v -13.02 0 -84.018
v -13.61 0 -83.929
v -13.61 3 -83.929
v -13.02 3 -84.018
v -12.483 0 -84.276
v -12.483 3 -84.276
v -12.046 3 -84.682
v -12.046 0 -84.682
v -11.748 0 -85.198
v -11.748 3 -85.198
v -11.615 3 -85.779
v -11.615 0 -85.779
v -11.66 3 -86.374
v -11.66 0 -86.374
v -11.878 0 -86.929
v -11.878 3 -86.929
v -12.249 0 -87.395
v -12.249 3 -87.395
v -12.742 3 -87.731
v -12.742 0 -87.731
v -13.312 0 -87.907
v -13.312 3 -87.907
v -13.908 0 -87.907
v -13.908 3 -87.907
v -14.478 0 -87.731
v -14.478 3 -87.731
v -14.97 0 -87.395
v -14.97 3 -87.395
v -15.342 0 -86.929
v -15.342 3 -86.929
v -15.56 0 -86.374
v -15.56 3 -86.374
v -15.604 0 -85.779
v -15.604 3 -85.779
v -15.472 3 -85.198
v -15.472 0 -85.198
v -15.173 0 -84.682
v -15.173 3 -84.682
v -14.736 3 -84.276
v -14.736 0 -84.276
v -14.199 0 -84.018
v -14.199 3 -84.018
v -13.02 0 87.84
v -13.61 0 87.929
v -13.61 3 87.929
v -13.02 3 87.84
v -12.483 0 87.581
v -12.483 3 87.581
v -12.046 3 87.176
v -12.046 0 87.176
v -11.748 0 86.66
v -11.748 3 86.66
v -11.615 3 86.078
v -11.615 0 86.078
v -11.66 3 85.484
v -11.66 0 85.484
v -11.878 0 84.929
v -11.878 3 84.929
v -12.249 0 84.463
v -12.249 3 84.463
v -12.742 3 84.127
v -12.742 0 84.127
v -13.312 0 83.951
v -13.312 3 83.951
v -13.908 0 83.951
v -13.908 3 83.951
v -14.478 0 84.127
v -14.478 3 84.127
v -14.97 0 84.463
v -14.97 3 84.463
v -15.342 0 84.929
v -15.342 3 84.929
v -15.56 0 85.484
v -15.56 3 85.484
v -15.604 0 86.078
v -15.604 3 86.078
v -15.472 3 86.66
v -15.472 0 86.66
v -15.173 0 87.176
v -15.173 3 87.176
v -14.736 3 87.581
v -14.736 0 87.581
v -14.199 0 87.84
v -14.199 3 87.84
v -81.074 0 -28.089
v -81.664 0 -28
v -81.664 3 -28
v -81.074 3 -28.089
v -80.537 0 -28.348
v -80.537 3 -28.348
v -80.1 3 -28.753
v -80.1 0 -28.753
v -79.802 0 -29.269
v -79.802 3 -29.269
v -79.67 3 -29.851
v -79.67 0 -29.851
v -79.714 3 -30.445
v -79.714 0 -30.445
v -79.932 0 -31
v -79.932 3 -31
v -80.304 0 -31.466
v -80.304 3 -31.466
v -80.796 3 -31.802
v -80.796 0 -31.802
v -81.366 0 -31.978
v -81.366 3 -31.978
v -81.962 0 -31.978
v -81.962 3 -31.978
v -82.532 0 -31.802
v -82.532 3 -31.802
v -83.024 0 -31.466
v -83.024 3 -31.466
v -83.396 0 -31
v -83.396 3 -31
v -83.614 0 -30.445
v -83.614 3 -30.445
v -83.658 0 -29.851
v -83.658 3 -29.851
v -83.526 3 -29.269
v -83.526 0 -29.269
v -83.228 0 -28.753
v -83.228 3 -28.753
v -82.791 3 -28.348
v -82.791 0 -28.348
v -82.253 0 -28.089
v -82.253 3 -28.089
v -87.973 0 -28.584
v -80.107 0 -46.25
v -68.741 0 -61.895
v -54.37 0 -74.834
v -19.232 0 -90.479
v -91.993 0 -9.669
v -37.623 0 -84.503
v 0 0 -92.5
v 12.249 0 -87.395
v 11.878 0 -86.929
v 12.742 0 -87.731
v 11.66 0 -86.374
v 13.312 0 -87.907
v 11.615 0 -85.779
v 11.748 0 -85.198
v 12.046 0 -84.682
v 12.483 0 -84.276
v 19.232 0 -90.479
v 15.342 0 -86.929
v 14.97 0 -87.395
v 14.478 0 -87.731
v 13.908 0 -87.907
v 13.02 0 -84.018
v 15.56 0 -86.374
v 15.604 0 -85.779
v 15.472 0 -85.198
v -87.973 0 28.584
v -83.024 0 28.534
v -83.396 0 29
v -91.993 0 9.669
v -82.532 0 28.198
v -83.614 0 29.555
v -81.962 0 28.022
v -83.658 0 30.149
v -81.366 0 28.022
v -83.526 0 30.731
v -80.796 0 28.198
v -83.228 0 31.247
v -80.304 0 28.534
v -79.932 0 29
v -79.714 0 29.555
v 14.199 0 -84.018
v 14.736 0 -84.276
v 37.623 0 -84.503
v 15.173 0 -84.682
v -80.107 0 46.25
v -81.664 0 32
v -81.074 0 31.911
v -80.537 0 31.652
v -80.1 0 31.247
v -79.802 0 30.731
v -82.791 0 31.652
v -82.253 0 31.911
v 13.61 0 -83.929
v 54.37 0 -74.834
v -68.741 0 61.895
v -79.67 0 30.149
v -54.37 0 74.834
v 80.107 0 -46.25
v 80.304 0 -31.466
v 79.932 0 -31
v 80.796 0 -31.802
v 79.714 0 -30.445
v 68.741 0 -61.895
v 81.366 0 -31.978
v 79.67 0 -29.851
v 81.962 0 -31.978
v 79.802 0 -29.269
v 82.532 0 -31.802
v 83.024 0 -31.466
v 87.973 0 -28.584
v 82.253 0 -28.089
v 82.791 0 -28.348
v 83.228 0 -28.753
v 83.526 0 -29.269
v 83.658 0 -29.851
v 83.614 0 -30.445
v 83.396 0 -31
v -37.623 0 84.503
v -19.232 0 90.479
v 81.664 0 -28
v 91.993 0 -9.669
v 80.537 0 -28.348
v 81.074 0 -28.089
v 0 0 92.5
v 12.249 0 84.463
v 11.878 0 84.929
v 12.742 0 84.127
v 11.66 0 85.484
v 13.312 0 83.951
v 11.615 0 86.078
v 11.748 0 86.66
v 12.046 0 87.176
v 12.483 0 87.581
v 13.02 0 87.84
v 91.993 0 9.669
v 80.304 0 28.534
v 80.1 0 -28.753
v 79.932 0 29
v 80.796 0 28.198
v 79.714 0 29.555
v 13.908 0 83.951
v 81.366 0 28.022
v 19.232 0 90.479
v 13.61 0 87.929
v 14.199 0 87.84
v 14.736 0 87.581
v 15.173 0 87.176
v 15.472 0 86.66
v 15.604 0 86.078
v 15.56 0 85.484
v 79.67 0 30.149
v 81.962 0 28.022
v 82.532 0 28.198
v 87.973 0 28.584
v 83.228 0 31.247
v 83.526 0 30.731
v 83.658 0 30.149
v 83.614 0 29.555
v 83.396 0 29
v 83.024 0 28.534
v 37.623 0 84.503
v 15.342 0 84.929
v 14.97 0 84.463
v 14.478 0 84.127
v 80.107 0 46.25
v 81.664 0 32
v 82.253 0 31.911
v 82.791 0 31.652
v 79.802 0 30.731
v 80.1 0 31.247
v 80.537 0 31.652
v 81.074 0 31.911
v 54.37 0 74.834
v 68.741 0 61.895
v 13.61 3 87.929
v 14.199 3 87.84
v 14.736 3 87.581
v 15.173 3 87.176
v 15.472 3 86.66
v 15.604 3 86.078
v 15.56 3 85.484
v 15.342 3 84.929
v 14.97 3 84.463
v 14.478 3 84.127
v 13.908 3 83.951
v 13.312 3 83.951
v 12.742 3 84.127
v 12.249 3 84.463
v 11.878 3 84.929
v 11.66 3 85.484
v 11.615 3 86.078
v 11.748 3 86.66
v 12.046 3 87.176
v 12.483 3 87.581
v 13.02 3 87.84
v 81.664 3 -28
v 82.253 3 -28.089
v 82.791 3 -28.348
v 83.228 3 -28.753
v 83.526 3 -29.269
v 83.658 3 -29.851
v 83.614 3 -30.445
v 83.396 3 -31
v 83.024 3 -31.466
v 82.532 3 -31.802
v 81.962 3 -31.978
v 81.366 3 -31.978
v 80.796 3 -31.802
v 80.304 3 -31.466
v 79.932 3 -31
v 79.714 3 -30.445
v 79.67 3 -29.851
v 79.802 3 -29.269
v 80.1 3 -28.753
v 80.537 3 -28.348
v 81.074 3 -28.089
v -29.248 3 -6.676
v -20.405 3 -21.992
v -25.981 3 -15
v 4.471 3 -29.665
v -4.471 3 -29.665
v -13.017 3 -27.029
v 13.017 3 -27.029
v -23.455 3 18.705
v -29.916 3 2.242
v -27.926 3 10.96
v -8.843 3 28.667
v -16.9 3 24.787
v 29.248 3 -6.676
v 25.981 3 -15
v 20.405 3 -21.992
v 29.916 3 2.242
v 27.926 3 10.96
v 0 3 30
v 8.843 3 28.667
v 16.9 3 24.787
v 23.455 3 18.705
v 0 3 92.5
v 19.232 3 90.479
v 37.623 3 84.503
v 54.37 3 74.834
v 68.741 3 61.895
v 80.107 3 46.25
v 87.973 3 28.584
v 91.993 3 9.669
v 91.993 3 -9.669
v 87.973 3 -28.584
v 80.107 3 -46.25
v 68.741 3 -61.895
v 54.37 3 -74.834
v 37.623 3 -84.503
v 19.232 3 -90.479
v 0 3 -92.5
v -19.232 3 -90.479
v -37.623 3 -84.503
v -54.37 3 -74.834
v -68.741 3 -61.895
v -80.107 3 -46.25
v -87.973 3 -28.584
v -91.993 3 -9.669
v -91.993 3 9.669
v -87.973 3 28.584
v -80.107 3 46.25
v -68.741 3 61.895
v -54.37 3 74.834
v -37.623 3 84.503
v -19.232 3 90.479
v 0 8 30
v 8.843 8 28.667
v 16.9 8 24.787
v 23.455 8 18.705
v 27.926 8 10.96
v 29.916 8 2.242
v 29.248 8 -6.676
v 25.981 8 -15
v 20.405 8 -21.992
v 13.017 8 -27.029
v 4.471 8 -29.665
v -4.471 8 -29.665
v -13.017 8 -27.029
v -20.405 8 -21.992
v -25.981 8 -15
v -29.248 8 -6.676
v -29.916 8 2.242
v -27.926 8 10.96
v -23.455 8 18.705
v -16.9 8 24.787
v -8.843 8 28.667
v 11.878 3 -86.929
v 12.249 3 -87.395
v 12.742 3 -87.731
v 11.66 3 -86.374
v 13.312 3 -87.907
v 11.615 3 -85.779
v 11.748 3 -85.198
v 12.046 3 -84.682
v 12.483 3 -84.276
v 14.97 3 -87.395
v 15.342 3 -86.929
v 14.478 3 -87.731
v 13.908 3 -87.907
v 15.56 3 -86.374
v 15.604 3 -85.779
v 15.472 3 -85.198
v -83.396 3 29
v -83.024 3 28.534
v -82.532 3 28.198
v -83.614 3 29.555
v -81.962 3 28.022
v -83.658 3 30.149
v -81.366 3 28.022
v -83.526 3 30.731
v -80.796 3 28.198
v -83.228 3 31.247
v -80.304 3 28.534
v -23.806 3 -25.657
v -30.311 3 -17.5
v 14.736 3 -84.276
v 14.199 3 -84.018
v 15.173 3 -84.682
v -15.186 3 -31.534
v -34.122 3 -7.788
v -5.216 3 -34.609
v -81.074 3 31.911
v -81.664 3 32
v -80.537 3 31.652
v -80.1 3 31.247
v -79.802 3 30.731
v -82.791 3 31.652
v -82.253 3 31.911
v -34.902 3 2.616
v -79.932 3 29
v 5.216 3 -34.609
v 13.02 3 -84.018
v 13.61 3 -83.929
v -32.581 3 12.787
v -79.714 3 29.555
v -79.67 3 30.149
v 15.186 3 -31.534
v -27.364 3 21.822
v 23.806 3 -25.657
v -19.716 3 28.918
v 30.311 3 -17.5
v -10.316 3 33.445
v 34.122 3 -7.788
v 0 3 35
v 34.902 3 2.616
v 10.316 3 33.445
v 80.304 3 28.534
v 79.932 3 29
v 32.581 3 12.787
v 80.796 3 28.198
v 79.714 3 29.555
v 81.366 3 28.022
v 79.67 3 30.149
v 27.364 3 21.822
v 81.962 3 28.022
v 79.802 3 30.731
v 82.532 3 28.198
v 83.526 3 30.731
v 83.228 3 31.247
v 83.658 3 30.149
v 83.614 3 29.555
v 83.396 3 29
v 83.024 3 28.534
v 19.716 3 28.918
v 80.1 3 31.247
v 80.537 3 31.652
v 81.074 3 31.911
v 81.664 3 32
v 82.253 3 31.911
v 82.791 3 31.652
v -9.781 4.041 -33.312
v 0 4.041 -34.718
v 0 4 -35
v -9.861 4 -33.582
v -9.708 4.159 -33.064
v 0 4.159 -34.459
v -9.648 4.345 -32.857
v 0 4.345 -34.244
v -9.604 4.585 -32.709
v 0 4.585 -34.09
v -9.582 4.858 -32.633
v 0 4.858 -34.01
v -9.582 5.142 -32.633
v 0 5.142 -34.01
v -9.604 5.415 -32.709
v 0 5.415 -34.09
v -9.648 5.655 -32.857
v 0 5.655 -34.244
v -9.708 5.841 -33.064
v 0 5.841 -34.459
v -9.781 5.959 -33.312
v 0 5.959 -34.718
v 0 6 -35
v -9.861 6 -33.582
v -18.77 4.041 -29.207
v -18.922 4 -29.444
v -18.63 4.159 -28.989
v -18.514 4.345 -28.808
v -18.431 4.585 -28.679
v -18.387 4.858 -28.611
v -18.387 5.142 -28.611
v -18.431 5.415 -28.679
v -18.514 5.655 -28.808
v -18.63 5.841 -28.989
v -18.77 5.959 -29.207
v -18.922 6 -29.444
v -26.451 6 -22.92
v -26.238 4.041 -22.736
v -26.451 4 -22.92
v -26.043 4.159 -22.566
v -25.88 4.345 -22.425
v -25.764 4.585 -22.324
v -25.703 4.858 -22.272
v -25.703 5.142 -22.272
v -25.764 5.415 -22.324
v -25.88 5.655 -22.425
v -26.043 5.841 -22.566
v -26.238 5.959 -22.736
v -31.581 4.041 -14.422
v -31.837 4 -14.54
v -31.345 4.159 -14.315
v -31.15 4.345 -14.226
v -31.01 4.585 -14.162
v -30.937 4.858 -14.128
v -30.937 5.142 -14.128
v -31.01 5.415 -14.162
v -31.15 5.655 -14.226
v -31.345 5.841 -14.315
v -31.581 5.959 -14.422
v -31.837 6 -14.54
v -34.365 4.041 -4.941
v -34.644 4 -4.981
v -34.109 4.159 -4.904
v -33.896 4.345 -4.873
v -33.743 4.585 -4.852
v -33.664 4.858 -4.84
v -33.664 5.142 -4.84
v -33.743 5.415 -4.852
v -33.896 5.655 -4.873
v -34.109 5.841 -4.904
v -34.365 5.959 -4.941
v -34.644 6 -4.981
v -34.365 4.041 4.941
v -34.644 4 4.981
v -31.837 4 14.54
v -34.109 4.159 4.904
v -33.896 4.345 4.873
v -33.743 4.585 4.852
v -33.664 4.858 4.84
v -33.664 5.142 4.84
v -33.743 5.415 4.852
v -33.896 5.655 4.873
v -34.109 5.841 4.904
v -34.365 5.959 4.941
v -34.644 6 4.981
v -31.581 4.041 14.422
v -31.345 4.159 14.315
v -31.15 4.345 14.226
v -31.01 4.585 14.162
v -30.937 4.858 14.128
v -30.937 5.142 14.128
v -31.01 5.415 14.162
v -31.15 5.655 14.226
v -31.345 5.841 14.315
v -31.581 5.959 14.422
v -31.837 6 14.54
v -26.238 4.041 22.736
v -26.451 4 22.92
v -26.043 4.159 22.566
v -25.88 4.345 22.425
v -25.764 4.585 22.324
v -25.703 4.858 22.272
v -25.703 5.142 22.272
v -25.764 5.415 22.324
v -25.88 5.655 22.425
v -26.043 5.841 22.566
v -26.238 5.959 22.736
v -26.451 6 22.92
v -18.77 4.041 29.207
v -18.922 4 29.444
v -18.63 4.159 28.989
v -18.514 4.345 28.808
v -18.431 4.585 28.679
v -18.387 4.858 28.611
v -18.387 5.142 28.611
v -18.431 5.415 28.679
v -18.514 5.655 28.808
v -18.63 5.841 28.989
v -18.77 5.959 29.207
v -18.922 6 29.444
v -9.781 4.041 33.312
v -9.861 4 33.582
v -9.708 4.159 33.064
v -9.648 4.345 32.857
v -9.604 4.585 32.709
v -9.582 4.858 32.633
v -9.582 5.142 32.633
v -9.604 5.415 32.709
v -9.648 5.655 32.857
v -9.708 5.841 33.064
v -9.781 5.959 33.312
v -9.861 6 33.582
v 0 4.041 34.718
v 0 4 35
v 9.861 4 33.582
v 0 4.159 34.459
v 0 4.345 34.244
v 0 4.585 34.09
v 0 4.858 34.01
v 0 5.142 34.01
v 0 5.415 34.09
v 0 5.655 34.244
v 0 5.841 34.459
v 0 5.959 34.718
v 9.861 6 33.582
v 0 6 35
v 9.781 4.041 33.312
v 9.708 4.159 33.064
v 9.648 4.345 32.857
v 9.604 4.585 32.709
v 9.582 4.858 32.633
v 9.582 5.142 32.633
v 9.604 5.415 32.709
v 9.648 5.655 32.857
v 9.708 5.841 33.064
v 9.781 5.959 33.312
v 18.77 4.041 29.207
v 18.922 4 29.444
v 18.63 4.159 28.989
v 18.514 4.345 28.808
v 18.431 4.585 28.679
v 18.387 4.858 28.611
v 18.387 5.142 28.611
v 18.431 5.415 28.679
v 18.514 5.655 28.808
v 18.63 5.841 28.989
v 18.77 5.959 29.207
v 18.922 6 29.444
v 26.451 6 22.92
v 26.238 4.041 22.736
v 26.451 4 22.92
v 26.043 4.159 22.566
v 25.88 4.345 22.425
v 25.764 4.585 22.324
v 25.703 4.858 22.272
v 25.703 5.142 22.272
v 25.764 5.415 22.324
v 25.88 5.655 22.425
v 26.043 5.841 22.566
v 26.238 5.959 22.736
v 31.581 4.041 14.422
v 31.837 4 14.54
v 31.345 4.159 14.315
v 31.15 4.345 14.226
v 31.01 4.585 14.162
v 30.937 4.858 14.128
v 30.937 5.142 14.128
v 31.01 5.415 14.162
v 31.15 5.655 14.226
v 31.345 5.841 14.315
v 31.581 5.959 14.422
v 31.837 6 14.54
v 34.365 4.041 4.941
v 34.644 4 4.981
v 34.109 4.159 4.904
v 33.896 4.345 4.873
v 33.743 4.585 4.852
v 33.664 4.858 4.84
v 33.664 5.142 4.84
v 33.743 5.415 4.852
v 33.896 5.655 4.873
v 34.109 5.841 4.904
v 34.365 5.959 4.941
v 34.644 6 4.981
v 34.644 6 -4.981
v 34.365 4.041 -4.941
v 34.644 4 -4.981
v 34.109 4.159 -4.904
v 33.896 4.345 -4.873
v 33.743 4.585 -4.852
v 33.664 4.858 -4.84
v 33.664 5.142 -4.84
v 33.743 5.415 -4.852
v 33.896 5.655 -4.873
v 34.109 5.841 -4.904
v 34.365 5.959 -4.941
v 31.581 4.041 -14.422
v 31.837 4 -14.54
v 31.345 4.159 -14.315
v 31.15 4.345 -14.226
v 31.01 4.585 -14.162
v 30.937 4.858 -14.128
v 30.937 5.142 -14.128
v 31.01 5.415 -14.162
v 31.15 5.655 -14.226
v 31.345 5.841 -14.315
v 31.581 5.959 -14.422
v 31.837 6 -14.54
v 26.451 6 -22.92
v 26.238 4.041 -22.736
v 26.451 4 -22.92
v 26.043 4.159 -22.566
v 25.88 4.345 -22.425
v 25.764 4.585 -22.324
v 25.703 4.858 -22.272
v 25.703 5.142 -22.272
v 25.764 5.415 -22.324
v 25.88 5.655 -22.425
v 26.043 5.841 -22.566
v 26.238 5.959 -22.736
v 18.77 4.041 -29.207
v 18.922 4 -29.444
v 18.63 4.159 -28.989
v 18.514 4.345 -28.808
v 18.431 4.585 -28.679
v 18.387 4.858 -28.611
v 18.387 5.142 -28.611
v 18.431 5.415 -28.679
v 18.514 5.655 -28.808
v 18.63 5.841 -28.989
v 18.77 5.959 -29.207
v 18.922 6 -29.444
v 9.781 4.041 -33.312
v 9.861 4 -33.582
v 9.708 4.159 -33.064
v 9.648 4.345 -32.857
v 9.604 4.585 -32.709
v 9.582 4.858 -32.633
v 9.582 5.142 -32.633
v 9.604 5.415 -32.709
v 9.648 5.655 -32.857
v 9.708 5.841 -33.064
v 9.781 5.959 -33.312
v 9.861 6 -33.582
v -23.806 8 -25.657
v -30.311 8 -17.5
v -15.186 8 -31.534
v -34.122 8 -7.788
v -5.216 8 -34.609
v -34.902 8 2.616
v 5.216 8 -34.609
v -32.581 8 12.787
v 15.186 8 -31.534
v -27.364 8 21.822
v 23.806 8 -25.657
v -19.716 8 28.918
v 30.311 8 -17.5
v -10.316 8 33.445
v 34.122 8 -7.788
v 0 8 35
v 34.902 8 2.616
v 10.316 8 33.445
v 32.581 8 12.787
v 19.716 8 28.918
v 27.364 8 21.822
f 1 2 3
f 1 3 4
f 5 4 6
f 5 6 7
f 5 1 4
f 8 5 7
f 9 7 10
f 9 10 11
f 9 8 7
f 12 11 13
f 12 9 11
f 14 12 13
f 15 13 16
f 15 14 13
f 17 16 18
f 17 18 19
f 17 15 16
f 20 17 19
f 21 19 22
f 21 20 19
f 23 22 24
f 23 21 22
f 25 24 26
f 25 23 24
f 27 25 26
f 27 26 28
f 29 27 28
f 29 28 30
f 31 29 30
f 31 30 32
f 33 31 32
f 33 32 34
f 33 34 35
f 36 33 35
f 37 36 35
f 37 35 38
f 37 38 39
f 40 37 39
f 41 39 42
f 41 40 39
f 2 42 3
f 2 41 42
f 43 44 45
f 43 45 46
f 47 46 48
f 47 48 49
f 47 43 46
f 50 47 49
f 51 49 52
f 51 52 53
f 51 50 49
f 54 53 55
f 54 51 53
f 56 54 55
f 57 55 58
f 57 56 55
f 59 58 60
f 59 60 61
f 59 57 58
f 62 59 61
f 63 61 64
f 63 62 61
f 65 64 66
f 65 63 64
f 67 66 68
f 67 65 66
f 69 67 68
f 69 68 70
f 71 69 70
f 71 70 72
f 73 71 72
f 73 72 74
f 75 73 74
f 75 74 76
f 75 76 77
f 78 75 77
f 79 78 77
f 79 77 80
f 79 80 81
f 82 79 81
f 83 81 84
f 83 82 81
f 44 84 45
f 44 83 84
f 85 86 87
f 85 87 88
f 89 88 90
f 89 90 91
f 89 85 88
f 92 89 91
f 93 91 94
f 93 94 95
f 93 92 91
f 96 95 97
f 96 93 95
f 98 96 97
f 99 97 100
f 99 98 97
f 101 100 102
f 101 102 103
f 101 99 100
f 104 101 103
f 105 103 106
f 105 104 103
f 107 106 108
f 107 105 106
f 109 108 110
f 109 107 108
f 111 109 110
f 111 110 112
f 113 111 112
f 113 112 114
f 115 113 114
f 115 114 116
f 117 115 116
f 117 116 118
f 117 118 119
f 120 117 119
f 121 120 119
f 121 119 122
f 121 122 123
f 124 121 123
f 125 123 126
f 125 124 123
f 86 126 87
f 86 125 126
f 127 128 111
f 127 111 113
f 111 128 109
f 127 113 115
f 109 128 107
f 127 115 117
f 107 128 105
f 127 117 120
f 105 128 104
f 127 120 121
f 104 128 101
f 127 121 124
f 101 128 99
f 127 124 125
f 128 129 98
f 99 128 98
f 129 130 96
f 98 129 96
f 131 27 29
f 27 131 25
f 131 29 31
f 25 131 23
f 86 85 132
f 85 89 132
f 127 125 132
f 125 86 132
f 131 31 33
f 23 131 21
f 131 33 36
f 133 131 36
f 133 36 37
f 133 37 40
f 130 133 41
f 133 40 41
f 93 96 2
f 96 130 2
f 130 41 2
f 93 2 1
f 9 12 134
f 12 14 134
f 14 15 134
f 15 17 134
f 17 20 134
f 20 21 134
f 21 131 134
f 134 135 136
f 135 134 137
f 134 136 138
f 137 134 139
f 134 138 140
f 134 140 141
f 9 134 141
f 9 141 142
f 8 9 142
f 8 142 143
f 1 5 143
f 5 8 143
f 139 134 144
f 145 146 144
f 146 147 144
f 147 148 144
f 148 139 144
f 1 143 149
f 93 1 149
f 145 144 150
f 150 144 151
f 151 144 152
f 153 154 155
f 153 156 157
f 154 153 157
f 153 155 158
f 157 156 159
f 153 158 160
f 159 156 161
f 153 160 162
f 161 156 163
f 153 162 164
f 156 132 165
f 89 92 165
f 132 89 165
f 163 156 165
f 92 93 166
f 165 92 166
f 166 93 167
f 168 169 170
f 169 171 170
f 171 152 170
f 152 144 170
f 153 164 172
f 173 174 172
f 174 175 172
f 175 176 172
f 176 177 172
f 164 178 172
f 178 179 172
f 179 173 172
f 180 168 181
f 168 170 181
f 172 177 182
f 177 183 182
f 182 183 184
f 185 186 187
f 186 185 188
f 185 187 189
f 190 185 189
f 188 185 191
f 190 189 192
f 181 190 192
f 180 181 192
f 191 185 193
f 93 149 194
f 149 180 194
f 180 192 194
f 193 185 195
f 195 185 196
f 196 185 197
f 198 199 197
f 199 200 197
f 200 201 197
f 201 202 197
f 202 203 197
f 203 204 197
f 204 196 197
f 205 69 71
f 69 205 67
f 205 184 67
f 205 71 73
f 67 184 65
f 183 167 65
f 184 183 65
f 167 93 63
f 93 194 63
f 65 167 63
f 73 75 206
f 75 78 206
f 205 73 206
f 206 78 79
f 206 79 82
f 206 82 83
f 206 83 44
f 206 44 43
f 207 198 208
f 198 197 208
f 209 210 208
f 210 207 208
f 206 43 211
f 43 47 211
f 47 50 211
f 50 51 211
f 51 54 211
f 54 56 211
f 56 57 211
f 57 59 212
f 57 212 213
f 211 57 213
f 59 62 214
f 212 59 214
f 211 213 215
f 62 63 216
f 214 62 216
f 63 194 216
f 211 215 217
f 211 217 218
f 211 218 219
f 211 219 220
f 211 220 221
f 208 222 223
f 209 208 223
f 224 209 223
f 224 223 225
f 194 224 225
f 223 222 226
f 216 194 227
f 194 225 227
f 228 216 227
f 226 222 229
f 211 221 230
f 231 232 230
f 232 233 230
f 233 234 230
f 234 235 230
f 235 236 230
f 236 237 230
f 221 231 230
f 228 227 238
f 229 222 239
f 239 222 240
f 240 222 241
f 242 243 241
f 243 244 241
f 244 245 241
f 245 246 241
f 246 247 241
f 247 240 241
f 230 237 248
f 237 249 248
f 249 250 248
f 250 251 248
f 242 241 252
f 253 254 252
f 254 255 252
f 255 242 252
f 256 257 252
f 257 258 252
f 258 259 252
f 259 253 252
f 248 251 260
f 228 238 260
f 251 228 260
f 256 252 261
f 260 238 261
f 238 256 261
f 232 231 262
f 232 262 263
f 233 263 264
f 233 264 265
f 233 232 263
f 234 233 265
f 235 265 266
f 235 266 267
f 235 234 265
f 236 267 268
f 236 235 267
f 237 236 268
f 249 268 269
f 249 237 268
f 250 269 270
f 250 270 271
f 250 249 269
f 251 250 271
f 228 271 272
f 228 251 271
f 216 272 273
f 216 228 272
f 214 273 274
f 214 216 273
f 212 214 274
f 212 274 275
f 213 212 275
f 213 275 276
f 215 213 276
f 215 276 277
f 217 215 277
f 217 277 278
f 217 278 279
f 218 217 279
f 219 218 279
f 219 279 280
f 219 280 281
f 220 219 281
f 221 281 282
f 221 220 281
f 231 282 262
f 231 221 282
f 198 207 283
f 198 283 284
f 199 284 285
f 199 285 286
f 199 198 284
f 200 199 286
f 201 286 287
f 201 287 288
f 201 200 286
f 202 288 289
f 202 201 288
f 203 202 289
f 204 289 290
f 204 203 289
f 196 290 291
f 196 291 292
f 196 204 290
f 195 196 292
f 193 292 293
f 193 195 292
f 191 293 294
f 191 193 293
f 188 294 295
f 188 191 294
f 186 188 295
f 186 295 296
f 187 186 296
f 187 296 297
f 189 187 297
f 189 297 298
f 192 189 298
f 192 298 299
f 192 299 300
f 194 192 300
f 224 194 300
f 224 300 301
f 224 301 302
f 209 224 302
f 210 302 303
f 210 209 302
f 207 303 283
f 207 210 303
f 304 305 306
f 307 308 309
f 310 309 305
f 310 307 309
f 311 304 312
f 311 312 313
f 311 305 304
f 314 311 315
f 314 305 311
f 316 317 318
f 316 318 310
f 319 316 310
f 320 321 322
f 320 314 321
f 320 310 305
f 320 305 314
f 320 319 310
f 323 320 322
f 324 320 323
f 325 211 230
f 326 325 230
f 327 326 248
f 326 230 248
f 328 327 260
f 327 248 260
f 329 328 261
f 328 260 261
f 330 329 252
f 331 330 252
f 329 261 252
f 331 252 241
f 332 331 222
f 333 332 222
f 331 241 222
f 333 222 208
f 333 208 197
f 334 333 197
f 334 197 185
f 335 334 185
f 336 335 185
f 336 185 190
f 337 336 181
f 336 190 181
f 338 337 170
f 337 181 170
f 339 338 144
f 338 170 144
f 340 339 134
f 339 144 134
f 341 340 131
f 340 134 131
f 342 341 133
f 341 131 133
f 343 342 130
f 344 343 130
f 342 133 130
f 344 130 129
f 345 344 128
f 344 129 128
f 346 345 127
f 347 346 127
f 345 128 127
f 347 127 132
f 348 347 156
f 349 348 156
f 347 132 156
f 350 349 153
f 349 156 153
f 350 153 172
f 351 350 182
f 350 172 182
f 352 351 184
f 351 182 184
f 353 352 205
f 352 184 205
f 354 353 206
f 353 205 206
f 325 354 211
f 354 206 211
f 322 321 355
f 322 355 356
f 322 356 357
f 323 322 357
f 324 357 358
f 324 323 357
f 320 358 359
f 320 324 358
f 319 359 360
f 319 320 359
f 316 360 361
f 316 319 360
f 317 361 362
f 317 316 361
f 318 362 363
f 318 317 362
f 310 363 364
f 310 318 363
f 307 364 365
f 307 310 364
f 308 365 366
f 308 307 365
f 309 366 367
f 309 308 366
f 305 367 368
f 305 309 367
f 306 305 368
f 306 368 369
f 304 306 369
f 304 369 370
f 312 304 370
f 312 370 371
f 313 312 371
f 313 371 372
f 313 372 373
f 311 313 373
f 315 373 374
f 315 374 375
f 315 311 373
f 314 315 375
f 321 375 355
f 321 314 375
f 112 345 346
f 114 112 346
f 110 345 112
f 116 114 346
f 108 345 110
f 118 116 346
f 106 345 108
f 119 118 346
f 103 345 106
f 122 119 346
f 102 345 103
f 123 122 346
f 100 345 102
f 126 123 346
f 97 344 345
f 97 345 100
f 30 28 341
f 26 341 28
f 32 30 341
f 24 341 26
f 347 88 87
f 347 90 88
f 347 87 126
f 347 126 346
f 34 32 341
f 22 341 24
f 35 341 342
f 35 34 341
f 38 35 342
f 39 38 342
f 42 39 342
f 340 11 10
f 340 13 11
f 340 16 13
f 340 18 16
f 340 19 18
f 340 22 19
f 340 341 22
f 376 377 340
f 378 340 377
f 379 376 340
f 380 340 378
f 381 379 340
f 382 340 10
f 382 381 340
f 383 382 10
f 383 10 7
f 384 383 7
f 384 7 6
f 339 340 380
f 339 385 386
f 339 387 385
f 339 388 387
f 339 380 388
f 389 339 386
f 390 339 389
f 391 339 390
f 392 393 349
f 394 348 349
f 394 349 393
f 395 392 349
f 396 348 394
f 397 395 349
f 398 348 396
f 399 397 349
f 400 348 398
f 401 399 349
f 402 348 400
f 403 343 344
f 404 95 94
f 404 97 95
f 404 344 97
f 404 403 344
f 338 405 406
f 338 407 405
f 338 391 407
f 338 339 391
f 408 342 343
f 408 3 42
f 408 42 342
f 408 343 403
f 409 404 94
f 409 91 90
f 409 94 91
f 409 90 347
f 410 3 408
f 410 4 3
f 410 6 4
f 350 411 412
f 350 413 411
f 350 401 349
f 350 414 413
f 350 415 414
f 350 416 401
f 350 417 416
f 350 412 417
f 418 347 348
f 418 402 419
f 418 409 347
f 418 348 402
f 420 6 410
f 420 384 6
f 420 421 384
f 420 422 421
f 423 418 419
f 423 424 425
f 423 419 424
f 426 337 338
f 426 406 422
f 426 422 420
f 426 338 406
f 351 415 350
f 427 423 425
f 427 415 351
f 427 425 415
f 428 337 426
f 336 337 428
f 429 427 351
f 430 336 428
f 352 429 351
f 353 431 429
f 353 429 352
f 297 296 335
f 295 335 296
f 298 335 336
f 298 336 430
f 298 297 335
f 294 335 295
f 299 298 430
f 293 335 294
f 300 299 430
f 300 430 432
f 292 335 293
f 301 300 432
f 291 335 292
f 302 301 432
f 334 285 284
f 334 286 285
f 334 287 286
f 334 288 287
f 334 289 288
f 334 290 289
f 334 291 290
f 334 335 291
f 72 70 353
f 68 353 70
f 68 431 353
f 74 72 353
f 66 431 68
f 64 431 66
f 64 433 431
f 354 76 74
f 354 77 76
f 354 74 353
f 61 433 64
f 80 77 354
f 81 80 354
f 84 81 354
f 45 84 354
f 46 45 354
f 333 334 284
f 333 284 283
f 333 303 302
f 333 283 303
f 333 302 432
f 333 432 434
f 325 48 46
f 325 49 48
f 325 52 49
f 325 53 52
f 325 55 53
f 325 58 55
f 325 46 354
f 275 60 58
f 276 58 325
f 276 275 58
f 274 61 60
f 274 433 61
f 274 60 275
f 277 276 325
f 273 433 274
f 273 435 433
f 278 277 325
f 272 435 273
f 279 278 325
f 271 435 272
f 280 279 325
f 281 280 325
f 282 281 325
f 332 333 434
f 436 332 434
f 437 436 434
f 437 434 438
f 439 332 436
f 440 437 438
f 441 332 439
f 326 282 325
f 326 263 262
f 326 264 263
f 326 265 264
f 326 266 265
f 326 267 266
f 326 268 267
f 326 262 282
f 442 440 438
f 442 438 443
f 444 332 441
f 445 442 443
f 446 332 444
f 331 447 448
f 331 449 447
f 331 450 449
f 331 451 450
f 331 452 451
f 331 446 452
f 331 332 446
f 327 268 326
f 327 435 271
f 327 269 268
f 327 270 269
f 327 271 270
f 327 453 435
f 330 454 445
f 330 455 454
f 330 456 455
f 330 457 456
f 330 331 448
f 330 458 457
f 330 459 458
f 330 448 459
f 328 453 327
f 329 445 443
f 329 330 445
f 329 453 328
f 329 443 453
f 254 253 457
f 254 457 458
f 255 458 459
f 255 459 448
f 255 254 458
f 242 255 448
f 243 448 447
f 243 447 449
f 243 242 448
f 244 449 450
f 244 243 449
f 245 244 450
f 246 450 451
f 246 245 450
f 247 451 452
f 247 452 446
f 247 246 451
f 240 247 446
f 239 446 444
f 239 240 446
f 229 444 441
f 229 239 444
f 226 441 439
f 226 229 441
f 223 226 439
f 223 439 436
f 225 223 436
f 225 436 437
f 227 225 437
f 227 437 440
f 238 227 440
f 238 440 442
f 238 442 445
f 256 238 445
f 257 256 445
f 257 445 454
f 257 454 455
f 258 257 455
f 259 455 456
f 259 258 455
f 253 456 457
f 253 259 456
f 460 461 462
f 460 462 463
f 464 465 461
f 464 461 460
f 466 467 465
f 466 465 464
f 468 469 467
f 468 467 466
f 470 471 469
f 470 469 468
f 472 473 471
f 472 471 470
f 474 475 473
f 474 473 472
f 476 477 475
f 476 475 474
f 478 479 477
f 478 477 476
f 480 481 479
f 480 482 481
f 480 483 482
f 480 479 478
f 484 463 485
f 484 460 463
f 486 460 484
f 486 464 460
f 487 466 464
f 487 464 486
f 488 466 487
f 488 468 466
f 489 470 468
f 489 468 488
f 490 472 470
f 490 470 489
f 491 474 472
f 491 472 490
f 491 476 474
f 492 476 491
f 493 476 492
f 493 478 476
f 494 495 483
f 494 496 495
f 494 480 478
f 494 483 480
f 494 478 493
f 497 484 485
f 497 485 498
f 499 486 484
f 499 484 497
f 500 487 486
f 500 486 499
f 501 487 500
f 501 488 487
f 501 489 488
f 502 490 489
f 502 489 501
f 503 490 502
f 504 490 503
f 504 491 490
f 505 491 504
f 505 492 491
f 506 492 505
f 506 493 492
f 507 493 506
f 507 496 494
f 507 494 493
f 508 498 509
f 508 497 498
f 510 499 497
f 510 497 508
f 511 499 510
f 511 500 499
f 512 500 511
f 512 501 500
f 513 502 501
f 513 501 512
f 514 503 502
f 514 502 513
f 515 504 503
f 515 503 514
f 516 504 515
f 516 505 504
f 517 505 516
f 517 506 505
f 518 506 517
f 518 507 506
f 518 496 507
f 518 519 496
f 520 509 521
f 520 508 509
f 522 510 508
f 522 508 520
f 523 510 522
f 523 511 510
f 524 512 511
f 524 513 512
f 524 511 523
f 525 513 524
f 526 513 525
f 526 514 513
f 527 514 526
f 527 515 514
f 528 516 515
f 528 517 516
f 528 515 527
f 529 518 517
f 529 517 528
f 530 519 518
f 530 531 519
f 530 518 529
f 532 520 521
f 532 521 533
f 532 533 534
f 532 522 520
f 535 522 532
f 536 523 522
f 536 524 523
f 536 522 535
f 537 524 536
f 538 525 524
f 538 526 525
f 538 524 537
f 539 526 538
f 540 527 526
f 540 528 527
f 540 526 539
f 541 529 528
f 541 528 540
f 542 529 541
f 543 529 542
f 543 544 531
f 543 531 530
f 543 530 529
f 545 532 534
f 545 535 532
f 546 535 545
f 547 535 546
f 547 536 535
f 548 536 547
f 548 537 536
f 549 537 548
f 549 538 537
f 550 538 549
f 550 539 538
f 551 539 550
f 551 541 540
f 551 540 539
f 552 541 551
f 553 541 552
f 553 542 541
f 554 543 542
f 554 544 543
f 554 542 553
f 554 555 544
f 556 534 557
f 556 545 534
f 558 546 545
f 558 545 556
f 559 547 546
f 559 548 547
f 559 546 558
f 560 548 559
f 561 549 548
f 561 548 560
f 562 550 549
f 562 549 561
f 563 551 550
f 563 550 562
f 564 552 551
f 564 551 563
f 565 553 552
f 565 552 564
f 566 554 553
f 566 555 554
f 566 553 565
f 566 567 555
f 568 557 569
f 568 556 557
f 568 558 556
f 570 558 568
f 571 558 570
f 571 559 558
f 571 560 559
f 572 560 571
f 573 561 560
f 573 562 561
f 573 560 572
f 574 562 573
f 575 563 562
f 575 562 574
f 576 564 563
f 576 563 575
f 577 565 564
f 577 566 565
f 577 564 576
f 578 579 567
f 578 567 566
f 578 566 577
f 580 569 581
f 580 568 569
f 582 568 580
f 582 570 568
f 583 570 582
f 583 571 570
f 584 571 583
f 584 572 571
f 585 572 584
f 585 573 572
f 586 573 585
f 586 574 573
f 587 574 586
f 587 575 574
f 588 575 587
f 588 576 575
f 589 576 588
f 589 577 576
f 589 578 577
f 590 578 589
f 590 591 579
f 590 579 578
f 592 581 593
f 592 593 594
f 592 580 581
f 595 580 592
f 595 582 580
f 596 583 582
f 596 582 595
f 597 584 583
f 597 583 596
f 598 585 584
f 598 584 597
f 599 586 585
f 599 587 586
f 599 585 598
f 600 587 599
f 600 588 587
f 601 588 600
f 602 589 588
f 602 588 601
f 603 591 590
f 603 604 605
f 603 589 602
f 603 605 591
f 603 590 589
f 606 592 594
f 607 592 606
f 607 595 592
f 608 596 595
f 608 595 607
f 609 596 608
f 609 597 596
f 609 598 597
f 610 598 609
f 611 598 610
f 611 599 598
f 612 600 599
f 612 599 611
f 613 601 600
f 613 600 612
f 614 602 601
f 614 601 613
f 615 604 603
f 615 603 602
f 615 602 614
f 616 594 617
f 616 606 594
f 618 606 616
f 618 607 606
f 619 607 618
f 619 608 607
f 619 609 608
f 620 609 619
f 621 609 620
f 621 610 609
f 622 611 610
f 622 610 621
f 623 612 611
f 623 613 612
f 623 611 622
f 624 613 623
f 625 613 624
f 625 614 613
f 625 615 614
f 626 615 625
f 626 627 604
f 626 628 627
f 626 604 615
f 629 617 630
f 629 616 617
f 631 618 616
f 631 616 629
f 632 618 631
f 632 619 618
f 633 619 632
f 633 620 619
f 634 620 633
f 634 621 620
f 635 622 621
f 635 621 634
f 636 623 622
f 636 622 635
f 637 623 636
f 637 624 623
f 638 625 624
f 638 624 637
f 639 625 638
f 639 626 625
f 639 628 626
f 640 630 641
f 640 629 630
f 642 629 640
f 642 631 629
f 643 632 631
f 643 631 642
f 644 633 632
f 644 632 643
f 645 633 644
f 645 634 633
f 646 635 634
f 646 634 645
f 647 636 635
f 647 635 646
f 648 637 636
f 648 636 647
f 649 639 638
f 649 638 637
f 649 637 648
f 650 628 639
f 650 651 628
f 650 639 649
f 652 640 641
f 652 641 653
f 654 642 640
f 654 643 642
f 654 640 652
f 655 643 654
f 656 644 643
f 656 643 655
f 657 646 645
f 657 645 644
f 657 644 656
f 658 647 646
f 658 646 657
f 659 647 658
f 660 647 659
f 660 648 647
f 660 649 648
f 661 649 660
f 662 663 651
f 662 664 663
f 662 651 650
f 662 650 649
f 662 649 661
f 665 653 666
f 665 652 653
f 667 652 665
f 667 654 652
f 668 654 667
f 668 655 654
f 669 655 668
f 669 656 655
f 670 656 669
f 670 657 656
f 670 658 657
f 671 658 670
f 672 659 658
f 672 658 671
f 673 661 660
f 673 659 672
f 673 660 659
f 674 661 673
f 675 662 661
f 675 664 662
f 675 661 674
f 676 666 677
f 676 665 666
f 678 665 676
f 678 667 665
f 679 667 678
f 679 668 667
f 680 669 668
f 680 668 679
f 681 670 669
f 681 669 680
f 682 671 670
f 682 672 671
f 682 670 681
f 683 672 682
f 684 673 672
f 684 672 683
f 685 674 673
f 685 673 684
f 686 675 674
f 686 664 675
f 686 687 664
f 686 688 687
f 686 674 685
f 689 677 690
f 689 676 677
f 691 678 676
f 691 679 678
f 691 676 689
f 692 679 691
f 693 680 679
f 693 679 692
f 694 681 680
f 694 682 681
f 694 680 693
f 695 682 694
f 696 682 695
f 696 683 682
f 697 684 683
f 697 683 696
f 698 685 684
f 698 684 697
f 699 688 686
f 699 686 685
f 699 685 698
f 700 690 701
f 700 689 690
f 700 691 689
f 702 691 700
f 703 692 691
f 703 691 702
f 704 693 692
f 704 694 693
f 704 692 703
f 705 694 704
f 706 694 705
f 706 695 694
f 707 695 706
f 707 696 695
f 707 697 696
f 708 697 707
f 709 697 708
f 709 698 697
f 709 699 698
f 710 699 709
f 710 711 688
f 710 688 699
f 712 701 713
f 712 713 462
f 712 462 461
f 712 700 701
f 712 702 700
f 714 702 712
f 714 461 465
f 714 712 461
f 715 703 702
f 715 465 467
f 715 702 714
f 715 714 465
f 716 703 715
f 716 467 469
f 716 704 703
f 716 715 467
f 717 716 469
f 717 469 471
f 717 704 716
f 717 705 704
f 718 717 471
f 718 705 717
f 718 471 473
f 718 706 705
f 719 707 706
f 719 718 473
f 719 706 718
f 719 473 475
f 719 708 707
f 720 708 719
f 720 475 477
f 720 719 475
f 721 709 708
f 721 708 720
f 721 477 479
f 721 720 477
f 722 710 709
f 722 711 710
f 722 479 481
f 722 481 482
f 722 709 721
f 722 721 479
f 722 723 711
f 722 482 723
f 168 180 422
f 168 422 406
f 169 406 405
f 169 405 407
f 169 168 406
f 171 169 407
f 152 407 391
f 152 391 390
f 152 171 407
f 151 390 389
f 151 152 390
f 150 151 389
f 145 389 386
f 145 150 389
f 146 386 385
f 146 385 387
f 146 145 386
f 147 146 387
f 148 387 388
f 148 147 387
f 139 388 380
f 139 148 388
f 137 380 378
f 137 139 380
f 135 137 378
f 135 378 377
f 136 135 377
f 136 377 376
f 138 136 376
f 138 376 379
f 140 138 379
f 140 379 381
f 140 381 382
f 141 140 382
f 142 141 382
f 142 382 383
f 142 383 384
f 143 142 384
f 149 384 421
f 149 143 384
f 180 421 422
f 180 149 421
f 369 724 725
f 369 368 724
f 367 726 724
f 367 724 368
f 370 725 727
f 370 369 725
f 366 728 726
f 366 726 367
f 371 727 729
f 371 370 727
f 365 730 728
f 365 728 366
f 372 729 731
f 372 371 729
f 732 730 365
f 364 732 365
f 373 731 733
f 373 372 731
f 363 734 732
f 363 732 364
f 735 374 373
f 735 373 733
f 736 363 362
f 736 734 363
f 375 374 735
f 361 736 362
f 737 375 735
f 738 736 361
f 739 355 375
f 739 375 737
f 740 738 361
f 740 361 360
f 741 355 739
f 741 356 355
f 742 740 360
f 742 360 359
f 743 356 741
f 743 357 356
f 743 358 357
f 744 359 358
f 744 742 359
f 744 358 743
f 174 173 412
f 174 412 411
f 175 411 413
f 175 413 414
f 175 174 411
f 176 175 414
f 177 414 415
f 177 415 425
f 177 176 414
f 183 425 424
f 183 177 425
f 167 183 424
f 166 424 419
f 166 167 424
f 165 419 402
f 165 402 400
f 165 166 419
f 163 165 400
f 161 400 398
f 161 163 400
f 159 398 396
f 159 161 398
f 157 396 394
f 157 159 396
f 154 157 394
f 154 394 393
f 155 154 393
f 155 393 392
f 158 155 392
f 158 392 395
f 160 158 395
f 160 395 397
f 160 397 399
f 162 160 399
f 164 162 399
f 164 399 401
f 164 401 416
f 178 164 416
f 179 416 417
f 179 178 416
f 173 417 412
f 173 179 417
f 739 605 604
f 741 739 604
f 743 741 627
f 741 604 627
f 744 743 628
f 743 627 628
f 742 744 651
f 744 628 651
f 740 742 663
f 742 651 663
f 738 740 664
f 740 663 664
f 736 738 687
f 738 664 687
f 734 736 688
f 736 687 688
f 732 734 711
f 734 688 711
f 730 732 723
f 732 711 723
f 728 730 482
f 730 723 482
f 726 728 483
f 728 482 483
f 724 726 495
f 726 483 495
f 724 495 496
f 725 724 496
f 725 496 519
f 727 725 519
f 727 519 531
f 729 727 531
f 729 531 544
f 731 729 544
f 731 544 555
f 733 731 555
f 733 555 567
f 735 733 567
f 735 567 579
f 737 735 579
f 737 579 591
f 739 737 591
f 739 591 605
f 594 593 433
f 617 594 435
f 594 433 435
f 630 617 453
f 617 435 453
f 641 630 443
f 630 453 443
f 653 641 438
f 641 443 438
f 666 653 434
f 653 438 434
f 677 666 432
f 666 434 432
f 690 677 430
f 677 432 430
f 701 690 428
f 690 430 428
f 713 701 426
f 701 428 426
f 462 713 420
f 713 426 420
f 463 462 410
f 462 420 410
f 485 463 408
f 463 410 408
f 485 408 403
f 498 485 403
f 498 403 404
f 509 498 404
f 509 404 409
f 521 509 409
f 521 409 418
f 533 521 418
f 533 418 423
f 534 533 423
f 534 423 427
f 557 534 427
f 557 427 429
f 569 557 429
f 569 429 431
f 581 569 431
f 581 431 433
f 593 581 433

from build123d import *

# Parameters (mm, degrees)
SKETCH1_R           = 92.5
SKETCH1_R_2         = 2
BOSS_EXTRUDE1_DEPTH = 3
BOSS_EXTRUDE2_START = 3
SKETCH1_3_R         = 35
SKETCH1_3_R_2       = 30
BOSS_EXTRUDE2_DEPTH = 5


with BuildPart() as part:
    # Sketch1 → Boss-Extrude1 (new body)
    with BuildSketch(Plane(origin=(0, 0, 0), x_dir=(1, 0, 0), z_dir=(0, 1, 0))):
        Circle(SKETCH1_R)
        with Locations((-13.609798459, -85.928885632)):
            Circle(SKETCH1_R_2, mode=Mode.SUBTRACT)
        with Locations((-81.663945533, -30)):
            Circle(SKETCH1_R_2, mode=Mode.SUBTRACT)
        with Locations((13.609798459, -85.928885632)):
            Circle(SKETCH1_R_2, mode=Mode.SUBTRACT)
        with Locations((81.663945533, -30)):
            Circle(SKETCH1_R_2, mode=Mode.SUBTRACT)
        with Locations((-81.663945533, 30)):
            Circle(SKETCH1_R_2, mode=Mode.SUBTRACT)
        with Locations((-13.609798459, 85.928885632)):
            Circle(SKETCH1_R_2, mode=Mode.SUBTRACT)
        with Locations((81.663945533, 30)):
            Circle(SKETCH1_R_2, mode=Mode.SUBTRACT)
        with Locations((13.609798459, 85.928885632)):
            Circle(SKETCH1_R_2, mode=Mode.SUBTRACT)
    extrude(amount=BOSS_EXTRUDE1_DEPTH)

    # Sketch1<3> → Boss-Extrude2 (add)
    with BuildSketch(Plane(origin=(0, 0, 0), x_dir=(1, 0, 0), z_dir=(0, 1, 0)).offset(BOSS_EXTRUDE2_START)):
        Circle(SKETCH1_3_R)
        Circle(SKETCH1_3_R_2, mode=Mode.SUBTRACT)
    extrude(amount=BOSS_EXTRUDE2_DEPTH)

    # Sketch2 → Cut-Revolve1 (revolve, cut)
    with BuildSketch(Plane.XY):
        with BuildLine():
            Line((35, 6), (35, 4))
            ThreePointArc((35, 4), (34, 5), (35, 6))
        make_face()
    revolve(axis=Axis((0, 0, 0), (0, 1, 0)), mode=Mode.SUBTRACT)


solid = part.part
